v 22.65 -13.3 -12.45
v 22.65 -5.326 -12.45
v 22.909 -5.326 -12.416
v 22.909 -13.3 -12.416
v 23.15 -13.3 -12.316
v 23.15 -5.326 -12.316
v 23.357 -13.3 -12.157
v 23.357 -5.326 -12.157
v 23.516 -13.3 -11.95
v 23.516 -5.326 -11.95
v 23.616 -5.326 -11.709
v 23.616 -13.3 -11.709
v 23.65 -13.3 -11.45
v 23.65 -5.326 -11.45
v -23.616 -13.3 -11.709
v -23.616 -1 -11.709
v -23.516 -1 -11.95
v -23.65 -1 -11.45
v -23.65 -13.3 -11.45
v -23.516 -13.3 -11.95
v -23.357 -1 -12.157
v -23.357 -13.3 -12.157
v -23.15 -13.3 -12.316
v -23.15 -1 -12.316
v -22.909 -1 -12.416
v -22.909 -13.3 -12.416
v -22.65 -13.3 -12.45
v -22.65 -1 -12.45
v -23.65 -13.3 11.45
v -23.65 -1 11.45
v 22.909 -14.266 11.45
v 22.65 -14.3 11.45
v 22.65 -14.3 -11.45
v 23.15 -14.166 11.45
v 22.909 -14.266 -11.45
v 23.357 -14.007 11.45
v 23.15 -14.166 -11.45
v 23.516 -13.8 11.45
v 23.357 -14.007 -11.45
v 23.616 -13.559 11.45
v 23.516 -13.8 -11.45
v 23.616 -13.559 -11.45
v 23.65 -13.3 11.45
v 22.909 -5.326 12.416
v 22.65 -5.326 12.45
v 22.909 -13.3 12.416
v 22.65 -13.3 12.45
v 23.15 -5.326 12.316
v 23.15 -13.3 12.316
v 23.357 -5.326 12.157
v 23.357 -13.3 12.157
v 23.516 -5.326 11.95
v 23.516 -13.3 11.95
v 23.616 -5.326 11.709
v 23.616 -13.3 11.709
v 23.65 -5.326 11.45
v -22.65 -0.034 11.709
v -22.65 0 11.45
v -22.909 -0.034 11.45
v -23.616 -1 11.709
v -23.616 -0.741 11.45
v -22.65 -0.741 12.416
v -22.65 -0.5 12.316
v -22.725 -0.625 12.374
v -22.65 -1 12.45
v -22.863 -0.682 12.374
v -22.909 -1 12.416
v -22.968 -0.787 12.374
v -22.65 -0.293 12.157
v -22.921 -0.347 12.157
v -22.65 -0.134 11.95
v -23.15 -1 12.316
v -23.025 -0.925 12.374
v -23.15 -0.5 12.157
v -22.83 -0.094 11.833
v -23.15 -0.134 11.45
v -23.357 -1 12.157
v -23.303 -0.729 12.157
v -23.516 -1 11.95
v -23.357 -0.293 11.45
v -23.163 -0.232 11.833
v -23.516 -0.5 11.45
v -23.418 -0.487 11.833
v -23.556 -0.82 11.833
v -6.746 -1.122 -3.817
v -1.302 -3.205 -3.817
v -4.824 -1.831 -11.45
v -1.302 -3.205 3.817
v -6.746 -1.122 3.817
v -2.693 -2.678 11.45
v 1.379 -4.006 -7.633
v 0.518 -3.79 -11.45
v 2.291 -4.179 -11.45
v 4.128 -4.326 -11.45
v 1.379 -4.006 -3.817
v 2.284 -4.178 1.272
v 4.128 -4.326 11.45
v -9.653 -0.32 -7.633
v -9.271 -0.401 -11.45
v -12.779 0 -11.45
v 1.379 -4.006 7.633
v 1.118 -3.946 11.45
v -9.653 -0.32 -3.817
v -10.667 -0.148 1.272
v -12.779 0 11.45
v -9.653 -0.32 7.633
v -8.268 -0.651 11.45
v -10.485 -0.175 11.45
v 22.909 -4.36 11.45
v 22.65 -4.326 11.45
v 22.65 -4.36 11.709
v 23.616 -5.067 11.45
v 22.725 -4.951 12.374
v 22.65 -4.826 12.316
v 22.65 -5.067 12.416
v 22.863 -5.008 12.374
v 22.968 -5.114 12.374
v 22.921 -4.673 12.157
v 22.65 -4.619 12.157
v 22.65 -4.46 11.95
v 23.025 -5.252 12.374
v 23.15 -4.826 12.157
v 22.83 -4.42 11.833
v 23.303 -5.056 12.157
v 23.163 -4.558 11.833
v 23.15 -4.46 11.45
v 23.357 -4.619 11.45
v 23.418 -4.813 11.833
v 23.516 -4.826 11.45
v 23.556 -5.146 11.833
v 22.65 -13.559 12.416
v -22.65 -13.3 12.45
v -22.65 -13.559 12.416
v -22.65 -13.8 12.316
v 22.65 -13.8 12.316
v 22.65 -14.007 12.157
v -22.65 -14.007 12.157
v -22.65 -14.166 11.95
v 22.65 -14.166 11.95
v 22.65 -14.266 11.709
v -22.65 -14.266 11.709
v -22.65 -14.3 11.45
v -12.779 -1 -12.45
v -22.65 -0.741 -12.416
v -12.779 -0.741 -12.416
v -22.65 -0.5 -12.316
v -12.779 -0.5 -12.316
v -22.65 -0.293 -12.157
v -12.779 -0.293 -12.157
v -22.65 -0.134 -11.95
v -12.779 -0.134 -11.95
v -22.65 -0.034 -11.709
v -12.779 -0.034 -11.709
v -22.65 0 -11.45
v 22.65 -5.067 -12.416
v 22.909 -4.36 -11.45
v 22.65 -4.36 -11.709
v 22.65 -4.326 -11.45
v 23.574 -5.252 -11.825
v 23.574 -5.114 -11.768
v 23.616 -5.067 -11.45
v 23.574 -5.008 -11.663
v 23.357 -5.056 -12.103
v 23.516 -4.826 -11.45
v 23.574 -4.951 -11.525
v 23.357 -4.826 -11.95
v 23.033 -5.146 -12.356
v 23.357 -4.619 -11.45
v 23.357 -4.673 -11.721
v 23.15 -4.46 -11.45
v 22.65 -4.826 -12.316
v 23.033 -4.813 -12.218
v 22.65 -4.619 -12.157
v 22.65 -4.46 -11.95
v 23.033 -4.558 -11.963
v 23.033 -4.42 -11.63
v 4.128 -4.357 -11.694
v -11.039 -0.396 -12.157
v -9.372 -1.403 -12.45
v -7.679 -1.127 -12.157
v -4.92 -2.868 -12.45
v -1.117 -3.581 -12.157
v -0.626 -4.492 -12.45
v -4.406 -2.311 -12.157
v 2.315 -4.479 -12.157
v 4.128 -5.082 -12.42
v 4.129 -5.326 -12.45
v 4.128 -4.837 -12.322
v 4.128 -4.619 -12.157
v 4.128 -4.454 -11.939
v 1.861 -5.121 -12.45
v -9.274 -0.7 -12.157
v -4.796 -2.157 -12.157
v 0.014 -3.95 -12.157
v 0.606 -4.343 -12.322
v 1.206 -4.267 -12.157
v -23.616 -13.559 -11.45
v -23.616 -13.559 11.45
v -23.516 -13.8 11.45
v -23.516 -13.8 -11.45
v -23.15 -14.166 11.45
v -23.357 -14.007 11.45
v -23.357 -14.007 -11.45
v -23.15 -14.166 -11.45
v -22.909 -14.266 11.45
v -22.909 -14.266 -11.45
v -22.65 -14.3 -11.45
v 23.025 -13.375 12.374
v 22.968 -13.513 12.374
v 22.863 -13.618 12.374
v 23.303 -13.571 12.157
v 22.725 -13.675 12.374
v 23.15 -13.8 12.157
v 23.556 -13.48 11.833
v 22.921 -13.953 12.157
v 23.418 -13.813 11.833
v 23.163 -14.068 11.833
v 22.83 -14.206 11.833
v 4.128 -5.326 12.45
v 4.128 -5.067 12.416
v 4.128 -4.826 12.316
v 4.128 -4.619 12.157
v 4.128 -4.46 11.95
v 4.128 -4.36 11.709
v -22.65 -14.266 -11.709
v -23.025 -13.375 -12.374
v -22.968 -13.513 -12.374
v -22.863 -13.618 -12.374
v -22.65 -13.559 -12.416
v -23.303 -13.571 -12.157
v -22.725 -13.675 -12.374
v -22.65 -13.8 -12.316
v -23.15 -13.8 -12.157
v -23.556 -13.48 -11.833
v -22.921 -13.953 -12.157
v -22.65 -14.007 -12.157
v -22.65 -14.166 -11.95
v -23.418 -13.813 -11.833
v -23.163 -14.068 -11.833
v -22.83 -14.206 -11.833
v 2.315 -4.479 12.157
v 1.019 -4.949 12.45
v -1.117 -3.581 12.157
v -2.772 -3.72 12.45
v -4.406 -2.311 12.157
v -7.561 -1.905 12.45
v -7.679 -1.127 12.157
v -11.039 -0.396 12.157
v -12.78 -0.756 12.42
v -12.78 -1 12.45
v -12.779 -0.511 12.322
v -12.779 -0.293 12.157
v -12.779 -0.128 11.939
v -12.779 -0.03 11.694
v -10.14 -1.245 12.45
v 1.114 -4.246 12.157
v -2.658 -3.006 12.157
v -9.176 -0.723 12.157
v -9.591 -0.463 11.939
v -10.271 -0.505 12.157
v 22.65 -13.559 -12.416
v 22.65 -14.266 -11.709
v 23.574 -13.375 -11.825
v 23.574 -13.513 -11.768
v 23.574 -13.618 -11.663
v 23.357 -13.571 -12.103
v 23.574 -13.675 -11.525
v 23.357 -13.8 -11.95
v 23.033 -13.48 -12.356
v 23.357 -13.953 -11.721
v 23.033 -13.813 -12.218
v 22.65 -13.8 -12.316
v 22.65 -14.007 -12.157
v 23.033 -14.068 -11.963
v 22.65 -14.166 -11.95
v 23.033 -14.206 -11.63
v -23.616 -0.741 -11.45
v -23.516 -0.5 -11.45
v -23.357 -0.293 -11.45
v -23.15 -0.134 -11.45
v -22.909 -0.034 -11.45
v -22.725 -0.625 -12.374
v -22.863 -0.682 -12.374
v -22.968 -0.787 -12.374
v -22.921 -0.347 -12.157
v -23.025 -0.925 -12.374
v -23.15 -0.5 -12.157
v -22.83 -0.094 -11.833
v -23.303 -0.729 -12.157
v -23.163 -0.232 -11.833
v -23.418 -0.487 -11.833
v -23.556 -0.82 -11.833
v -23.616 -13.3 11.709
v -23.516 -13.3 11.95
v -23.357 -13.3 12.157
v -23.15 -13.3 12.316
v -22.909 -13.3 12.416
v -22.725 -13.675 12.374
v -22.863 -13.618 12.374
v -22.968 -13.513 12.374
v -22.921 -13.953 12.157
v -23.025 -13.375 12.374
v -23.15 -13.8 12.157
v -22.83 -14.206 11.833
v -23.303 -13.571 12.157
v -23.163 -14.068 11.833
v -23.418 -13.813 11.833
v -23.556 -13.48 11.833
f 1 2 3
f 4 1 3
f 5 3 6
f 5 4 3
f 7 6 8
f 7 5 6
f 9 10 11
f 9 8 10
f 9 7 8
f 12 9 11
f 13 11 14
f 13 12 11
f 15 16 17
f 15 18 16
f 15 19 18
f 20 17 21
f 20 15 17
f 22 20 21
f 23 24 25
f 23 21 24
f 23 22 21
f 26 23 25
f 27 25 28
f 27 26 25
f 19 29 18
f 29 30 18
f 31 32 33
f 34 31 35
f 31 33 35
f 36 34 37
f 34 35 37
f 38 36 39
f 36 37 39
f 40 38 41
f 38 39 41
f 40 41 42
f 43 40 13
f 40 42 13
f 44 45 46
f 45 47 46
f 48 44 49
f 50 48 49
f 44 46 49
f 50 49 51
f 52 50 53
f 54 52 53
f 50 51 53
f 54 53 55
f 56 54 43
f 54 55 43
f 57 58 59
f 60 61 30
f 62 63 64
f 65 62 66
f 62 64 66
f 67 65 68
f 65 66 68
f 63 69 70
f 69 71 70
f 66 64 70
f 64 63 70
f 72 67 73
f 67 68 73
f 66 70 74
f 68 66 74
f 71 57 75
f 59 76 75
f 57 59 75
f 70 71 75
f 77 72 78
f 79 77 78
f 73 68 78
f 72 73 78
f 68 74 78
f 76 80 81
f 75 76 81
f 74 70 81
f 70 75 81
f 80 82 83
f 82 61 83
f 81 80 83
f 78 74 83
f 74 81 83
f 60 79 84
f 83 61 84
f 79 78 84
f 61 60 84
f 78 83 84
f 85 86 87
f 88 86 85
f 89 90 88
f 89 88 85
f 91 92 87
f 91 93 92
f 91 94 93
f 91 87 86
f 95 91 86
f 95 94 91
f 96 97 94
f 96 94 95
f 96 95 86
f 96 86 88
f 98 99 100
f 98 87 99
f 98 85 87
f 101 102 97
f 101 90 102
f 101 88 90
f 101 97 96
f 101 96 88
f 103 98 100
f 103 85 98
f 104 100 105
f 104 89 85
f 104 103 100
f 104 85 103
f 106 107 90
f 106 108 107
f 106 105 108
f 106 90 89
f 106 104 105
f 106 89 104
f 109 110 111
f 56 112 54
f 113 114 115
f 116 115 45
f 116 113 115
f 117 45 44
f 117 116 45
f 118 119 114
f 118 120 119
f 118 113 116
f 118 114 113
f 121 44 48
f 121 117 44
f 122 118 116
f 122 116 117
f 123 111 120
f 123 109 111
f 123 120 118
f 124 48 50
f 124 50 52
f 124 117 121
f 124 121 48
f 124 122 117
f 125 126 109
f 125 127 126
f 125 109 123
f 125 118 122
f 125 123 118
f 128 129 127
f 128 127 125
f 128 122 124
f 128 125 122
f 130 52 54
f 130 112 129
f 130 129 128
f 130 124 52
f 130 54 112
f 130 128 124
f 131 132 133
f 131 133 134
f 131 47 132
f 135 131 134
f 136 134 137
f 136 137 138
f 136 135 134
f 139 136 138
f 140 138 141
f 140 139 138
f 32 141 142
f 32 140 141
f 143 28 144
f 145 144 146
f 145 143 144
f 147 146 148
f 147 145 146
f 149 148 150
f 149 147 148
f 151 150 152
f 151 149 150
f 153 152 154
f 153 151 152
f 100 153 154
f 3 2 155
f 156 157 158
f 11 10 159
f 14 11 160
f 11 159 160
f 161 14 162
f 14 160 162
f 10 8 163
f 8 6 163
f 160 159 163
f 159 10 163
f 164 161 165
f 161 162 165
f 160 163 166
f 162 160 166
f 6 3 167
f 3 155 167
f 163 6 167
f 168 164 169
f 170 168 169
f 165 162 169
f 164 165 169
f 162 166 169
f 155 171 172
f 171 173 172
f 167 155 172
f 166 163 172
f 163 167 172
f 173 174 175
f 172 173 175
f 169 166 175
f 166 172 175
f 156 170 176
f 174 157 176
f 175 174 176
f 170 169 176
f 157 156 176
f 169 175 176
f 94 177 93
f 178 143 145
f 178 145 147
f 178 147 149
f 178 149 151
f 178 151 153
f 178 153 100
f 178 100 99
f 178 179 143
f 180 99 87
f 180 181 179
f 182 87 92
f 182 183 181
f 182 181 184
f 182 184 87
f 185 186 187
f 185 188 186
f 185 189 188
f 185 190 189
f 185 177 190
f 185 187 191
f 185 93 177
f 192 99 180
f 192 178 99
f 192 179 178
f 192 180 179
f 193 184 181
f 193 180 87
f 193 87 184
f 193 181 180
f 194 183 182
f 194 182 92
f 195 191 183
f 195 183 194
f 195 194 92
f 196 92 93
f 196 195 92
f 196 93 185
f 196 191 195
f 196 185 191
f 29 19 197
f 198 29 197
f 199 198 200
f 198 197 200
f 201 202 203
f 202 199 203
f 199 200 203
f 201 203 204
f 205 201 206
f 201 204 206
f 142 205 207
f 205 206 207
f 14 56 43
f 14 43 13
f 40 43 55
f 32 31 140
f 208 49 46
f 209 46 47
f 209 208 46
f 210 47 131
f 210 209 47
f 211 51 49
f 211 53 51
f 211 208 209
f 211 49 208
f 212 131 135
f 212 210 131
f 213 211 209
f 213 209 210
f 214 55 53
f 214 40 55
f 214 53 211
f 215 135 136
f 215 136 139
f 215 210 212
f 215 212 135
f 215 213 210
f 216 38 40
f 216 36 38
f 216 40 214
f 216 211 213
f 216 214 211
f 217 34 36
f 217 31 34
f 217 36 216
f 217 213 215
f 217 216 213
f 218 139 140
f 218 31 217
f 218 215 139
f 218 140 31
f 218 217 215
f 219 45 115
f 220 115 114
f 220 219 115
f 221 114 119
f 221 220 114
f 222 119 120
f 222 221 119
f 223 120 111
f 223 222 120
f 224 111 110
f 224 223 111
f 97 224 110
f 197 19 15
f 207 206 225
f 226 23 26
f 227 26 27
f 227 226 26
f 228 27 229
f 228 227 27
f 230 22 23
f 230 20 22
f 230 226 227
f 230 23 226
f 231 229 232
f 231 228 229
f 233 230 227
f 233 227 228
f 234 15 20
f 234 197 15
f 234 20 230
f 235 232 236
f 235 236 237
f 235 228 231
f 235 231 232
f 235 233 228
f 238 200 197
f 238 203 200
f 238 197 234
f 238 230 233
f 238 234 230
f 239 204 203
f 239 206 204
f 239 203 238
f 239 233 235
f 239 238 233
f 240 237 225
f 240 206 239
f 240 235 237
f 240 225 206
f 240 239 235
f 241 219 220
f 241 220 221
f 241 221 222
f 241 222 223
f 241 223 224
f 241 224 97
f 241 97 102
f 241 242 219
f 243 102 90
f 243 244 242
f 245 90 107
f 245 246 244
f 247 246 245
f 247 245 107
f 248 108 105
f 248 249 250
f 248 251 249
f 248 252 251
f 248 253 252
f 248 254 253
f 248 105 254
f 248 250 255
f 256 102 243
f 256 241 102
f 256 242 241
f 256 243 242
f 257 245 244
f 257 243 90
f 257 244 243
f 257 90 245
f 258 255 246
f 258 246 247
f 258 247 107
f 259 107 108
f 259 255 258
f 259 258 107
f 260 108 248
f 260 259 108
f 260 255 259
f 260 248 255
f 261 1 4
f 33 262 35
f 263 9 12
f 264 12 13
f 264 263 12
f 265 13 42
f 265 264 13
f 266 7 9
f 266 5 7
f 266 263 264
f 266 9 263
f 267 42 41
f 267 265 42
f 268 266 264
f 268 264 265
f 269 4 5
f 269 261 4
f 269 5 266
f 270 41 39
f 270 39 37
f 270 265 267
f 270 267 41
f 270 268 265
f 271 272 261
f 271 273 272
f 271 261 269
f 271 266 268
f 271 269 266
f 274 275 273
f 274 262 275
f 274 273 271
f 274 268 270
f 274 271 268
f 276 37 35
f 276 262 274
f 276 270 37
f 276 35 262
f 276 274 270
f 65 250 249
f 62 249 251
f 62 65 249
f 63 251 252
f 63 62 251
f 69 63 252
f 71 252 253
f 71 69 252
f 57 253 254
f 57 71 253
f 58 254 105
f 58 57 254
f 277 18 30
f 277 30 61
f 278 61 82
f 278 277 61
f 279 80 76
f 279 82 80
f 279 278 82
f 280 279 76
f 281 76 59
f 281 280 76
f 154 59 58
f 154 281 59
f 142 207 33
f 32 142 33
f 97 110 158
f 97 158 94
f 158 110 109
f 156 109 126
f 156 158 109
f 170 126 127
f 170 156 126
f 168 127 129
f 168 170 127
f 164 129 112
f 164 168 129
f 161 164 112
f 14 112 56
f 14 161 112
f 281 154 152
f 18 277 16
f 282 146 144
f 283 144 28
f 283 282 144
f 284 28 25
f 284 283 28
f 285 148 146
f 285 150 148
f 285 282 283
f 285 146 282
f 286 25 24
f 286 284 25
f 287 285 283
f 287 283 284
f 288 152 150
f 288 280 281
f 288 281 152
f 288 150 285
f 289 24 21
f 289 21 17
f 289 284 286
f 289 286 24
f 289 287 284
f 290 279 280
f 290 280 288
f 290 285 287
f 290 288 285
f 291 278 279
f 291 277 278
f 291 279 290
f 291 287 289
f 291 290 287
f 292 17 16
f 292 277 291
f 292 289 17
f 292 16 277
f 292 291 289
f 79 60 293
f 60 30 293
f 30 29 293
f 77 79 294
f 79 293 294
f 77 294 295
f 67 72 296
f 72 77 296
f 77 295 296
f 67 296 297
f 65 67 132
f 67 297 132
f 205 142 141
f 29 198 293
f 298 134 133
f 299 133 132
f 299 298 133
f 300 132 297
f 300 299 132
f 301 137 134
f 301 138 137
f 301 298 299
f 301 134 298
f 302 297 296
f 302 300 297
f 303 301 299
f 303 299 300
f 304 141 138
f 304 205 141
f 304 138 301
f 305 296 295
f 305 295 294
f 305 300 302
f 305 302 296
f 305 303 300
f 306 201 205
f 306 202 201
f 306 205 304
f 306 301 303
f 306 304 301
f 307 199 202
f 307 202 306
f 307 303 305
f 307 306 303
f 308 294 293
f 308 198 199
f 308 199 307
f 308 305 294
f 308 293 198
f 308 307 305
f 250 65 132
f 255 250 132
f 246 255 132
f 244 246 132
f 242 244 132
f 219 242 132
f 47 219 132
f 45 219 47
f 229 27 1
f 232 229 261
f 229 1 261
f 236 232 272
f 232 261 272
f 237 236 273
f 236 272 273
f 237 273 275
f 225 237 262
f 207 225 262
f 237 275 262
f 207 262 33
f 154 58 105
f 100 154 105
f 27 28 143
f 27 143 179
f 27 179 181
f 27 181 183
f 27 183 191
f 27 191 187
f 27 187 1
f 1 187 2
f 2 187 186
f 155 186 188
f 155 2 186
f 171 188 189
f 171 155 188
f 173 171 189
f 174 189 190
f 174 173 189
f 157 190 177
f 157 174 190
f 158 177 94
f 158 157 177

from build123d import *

# Parameters (mm, degrees)
SKETCH2_W               = 47.3
SKETCH2_H               = 24.9
BOSS_EXTRUDE1_DEPTH     = 14.3
CUT_EXTRUDE1_DEPTH      = 38.199764784
CUT_EXTRUDE1_DEPTH_BACK = 38.199764784
FILLET1_R               = 1


with BuildPart() as part:
    # Sketch2 → Boss-Extrude1 (new body)
    with BuildSketch(Plane(origin=(0, 0, 0), x_dir=(1, 0, 0), z_dir=(0, 1, 0))):
        Rectangle(SKETCH2_W, SKETCH2_H)
    extrude(amount=-BOSS_EXTRUDE1_DEPTH)

    # Sketch3 → Cut-Extrude1 (cut, two sides: drawn at the far end of the back side and taken through both)
    with BuildSketch(Plane(origin=(0, 0, -12.45), x_dir=(-1, 0, 0), z_dir=(0, 0, -1)).offset(-CUT_EXTRUDE1_DEPTH_BACK)):
        with BuildLine():
            Line((-23.65, -4.326263992), (-4.128269017, -4.326263992))
            add(Edge.make_bspline(
                [(-4.128269017, -4.326263992), (1.486176846, -4.326263992), (6.258882745, 0), (12.779413221, 0)],
                knots=[0, 0, 0, 0, 1, 1, 1, 1], degree=3))
            Line((12.779413221, 0), (-23.65, 0))
            Line((-23.65, 0), (-23.65, -4.326263992))
        make_face()
    extrude(amount=CUT_EXTRUDE1_DEPTH + CUT_EXTRUDE1_DEPTH_BACK, mode=Mode.SUBTRACT)

    # Fillet1
    fillet1_edges = [part.edges().sort_by_distance(p)[0] for p in [
        (-23.65, -14.3, 0),
        (-23.65, 0, 0),
        (-18.214706611, 0, -12.45),
        (-23.65, -7.15, -12.45),
        (0, -14.3, -12.45),
        (13.889134509, -4.326263992, -12.45),
        (-4.294045932, -2.040368807, -12.45),
        (23.65, -9.313131996, -12.45),
        (23.65, -14.3, 0),
        (23.65, -4.326263992, 0),
        (13.889134509, -4.326263992, 12.45),
        (23.65, -9.313131996, 12.45),
        (0, -14.3, 12.45),
        (-23.65, -7.15, 12.45),
        (-18.214706611, 0, 12.45),
        (-4.294045921, -2.040368812, 12.45),
    ]]
    fillet(fillet1_edges, radius=FILLET1_R)


solid = part.part
